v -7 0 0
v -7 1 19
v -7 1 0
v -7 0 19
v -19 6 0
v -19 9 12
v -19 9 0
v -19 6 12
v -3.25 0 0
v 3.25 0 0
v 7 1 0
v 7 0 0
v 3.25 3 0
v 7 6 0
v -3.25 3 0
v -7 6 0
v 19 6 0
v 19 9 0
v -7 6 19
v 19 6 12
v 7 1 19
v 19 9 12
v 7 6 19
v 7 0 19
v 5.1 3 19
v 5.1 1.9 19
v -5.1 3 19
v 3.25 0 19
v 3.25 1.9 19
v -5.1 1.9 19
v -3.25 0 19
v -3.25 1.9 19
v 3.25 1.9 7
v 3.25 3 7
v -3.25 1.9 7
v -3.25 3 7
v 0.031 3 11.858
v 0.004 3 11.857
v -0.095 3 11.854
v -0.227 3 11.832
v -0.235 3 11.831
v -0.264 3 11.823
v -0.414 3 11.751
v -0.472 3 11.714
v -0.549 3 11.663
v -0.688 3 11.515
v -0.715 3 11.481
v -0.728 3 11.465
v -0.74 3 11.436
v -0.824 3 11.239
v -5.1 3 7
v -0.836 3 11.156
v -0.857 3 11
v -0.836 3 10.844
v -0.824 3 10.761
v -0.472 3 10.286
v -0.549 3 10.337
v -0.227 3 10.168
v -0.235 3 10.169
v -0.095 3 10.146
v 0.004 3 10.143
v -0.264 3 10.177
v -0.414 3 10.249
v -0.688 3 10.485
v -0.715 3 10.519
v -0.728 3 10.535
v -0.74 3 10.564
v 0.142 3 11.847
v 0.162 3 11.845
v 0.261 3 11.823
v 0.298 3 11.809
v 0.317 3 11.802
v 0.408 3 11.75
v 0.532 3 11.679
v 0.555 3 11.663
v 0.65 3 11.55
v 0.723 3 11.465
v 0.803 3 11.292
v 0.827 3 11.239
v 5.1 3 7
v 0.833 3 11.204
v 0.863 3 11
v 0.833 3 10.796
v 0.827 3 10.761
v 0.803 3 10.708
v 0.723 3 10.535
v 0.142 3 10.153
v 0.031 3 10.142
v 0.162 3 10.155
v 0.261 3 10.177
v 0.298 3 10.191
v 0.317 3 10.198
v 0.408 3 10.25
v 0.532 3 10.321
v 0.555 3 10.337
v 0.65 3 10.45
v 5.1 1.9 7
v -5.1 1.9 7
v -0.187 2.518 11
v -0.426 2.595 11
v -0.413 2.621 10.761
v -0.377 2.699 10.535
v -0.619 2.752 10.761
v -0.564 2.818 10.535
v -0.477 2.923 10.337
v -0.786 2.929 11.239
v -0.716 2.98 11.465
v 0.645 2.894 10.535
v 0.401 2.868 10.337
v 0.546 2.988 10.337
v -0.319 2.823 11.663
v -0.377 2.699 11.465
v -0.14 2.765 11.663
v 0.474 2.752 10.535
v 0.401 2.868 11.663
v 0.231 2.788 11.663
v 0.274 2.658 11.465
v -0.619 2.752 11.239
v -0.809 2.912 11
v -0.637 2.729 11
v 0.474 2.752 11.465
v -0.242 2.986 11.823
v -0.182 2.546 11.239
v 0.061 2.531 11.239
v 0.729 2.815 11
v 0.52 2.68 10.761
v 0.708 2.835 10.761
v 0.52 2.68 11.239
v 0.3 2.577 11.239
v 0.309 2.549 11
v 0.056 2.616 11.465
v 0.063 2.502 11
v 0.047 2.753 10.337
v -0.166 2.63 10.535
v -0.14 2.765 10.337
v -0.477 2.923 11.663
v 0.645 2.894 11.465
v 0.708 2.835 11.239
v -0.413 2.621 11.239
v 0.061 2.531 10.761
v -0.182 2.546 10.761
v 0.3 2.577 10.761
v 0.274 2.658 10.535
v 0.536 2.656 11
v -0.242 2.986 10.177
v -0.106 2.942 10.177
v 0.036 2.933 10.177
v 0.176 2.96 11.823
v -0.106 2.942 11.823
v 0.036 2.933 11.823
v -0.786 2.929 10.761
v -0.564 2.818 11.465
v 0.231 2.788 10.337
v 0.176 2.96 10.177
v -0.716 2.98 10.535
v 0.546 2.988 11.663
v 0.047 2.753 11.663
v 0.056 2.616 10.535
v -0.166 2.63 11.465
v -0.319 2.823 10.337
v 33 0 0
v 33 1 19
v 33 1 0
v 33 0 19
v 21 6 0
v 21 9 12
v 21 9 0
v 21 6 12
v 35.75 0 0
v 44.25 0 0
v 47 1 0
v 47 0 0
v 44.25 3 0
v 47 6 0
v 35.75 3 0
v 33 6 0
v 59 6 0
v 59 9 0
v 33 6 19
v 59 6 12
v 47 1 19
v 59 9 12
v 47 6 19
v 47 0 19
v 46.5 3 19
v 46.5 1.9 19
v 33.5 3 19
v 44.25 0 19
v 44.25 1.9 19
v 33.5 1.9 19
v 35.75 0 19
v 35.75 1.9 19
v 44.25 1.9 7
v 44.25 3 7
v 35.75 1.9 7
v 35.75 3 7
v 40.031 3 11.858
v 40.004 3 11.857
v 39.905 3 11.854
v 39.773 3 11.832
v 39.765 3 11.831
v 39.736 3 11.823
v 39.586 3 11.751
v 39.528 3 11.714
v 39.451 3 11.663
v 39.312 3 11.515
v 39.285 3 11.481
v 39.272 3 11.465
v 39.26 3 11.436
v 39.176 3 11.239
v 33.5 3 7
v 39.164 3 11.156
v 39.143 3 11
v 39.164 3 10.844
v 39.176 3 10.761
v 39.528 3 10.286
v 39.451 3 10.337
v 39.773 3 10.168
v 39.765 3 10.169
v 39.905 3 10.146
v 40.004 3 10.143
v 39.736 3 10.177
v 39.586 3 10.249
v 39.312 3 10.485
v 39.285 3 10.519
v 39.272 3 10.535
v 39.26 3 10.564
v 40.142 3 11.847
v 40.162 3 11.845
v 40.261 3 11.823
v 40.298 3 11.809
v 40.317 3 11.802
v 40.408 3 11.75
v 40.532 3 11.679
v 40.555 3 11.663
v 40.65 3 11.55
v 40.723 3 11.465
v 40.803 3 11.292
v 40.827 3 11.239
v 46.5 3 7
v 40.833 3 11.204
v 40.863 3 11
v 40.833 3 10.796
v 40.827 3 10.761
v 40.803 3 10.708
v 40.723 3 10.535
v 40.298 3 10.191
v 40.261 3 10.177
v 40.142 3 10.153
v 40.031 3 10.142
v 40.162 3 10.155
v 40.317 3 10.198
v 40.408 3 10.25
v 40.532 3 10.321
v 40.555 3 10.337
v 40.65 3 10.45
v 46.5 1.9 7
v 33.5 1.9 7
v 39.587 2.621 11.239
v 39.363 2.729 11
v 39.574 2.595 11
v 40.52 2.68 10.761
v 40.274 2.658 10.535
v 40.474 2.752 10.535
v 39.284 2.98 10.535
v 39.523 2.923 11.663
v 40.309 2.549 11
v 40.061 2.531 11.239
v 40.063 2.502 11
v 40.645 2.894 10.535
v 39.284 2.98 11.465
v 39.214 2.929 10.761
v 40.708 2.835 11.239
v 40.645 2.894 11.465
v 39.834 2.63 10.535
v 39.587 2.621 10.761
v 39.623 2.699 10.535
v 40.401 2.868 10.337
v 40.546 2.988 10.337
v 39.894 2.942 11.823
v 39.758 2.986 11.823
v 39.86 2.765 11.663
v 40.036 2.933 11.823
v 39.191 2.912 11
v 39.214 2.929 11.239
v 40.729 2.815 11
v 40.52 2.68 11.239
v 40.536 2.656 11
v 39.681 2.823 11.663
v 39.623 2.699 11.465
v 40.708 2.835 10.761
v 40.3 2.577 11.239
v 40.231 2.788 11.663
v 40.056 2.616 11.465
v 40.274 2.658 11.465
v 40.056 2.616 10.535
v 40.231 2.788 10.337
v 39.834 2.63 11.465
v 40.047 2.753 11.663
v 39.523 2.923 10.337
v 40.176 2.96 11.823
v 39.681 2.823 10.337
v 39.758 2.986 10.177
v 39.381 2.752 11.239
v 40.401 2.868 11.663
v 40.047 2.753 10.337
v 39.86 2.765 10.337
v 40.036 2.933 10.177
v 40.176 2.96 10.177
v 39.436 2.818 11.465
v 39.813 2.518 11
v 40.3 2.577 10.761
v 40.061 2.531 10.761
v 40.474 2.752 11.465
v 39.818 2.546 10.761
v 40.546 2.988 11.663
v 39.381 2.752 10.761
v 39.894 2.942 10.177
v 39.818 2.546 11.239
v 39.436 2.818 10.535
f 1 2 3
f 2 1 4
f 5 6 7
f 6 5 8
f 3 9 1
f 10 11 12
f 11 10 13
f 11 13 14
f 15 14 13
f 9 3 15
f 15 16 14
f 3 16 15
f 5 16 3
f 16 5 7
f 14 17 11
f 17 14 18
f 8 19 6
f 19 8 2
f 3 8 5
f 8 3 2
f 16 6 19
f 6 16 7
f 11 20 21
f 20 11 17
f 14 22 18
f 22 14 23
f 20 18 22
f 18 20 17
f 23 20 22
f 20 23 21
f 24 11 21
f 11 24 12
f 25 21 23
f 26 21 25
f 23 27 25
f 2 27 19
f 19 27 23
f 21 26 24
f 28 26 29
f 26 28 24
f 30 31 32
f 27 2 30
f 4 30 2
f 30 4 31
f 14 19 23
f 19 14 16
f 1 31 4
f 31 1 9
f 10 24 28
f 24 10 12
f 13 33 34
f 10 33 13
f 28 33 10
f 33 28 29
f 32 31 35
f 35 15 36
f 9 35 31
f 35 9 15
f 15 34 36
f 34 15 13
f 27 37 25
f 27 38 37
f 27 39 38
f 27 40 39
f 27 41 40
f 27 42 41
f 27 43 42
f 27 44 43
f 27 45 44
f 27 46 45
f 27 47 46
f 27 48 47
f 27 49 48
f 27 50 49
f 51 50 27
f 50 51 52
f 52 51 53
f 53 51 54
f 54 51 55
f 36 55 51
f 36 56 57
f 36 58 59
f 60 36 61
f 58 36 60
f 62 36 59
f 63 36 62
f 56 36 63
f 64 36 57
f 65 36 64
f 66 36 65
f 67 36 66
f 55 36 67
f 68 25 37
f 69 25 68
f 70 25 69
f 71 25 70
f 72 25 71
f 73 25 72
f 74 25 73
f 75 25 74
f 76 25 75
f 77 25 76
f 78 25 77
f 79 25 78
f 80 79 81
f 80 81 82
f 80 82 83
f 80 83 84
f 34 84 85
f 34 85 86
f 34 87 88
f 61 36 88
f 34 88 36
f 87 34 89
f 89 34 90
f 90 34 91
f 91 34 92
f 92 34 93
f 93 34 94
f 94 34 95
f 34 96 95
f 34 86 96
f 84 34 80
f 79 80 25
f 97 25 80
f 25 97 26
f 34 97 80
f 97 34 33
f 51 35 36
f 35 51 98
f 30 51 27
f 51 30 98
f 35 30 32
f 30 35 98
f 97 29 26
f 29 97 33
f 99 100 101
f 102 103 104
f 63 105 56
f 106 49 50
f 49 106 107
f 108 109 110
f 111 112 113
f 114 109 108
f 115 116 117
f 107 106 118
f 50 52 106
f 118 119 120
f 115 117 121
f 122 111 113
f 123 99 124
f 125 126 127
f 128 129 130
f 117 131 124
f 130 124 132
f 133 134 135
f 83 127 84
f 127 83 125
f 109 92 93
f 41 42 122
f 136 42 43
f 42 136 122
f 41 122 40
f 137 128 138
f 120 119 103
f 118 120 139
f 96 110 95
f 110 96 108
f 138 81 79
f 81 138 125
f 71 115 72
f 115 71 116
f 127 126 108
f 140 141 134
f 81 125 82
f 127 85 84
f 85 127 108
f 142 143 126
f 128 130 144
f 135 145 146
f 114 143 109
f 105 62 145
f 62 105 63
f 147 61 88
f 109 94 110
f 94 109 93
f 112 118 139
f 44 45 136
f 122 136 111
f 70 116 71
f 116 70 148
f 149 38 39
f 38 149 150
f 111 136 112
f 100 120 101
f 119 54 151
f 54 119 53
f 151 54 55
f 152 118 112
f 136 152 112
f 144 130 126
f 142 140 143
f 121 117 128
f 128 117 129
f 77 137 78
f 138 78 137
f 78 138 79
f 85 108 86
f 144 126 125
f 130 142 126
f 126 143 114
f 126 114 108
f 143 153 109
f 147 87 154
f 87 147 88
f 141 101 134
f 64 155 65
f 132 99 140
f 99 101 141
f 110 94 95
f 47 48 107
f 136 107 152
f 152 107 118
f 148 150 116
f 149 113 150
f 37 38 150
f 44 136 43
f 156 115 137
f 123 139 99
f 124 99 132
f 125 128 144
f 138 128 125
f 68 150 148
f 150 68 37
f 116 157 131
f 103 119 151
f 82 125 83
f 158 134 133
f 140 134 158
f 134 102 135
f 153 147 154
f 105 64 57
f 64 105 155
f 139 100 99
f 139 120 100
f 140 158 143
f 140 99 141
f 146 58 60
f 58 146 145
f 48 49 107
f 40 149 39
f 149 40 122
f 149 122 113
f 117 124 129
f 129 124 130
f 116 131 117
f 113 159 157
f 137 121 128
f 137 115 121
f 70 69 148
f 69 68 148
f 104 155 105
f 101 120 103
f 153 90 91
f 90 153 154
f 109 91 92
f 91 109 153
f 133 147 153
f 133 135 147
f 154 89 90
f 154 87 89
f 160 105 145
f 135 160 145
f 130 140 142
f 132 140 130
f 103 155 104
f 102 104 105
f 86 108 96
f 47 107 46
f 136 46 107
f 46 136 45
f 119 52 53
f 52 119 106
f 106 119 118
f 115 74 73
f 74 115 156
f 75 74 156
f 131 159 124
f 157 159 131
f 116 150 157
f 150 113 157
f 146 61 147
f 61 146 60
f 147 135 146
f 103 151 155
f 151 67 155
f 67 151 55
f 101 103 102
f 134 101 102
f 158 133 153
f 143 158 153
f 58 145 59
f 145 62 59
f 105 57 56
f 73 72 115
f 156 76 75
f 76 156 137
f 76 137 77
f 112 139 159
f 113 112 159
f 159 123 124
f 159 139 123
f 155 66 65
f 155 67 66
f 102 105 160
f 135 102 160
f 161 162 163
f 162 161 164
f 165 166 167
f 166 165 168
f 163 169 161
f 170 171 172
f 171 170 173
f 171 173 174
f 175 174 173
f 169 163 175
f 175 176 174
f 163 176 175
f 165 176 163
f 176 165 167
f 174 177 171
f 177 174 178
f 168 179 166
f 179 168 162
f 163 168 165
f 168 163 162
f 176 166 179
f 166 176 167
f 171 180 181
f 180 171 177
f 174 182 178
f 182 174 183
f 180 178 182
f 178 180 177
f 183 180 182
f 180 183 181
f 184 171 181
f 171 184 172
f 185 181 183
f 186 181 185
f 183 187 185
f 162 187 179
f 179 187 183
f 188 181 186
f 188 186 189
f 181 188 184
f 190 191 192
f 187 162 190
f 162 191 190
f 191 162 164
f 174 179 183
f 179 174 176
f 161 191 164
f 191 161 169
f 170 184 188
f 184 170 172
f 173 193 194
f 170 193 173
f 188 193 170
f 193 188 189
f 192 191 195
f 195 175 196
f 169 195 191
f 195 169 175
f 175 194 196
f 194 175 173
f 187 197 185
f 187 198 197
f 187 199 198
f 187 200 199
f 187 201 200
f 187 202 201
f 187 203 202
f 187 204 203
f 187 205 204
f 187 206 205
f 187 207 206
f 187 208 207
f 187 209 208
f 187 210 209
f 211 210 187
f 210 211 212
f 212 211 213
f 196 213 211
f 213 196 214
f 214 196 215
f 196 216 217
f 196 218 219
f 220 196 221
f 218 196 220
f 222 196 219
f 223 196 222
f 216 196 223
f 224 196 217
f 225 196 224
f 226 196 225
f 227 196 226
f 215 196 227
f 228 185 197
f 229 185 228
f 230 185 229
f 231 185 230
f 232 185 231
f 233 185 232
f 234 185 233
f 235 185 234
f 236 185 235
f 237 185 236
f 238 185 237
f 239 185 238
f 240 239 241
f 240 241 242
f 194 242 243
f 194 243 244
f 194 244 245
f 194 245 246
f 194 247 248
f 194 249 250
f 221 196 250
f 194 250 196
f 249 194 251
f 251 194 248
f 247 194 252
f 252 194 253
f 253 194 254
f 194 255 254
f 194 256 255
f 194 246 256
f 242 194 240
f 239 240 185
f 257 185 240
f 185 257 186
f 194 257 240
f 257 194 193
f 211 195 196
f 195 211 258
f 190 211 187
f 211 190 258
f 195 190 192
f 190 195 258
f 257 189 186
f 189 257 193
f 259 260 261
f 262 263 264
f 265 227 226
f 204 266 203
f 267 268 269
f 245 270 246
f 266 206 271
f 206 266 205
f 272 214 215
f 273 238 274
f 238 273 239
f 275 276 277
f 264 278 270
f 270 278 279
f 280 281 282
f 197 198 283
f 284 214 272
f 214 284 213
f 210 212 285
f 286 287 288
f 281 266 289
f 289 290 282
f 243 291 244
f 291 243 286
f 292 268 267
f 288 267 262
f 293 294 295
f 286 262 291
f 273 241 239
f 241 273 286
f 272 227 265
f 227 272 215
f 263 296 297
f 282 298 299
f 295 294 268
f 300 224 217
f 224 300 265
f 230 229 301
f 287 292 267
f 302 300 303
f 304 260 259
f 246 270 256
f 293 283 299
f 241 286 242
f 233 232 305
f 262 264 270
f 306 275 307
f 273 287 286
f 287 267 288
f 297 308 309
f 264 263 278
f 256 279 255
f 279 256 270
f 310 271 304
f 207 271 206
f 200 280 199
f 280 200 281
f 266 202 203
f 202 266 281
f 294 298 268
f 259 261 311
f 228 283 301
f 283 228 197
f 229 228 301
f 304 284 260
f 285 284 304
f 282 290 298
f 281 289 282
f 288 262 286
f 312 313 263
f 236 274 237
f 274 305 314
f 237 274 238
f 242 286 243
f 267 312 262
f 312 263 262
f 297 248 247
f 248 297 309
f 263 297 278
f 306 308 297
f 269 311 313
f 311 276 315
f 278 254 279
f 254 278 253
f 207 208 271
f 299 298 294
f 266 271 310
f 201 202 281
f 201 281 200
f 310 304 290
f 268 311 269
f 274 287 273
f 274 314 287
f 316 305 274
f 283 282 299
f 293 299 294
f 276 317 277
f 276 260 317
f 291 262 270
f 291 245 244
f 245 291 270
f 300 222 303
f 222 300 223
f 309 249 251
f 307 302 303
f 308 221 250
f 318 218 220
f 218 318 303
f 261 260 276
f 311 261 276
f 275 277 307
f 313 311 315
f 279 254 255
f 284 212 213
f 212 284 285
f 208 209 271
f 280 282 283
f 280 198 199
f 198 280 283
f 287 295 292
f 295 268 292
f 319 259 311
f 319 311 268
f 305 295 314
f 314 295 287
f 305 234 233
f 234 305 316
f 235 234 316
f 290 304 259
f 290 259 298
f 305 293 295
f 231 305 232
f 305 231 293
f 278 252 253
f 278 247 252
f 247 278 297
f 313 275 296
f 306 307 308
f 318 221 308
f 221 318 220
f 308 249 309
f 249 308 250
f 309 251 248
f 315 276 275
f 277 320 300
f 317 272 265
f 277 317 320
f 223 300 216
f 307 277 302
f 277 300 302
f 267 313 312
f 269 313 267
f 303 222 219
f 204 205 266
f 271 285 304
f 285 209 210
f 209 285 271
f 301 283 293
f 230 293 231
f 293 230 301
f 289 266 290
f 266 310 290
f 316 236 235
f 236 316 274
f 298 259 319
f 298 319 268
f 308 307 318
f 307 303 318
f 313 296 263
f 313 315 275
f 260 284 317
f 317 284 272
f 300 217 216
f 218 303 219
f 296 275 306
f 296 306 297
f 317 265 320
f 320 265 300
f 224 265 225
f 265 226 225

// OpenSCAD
/*
 * Spare part for staple remover
 */
small();   // for narrower end
translate([40,0,0]) {
    big();   // for wider end
}

// Her trenger du nok ikke to separate polyhedron-er. Det hadde vært lettere med én vinge og mirror().
module wings () {
    points1 = [
        [-7,1,0],
        [-19,6,0],
        [-19,6,12],
        [-7,1,19],
        [-7,6,0],
        [-19,9,0],
        [-19,9,12],
        [-7,6,19]
    ];
    faces1 = [
        [0,4,5,1],
        [0,1,2,3],
        [4,7,6,5],
        [1,5,6,2],
        [2,6,7,3],
        [0,3,7,4]
    ];
    
    points2 = [
        [7,1,0],
        [19,6,0],
        [19,6,12],
        [7,1,19],
        [7,6,0],
        [19,9,0],
        [19,9,12],
        [7,6,19]
    ];
    faces2 = [
        [0,4,5,1],
        [0,1,2,3],
        [4,7,6,5],
        [1,5,6,2],
        [2,6,7,3],
        [0,3,7,4]
    ];

    polyhedron(points = points1, faces = faces1);
    polyhedron(points = points2, faces = faces2);
}

module block () {
    wings();
    translate ([-7,0,0]){
        cube([14,6,19]);
    }
}

module small () {
    translate ([0,3.5,11]){
        sphere (d=2, $fn=25);
    }
    difference () {
        block ();
        translate ([-3.25,0,0]) {
            cube ([6.5,3,19]);
        }
        translate ([-5.1,1.9,7]) {
            cube ([10.2,1.1,12]);
        }
    }
}

module big () {
    translate ([0,3.5,11]) {
        sphere (d=2, $fn=25);
    }
    difference () {
        block();
        translate ([-4.25,0,0]) {
            cube ([8.5,3,19]);
        }
        translate ([-6.5,1.9,7]) {
            cube ([13,1.1,12]);
        }
    }
}
